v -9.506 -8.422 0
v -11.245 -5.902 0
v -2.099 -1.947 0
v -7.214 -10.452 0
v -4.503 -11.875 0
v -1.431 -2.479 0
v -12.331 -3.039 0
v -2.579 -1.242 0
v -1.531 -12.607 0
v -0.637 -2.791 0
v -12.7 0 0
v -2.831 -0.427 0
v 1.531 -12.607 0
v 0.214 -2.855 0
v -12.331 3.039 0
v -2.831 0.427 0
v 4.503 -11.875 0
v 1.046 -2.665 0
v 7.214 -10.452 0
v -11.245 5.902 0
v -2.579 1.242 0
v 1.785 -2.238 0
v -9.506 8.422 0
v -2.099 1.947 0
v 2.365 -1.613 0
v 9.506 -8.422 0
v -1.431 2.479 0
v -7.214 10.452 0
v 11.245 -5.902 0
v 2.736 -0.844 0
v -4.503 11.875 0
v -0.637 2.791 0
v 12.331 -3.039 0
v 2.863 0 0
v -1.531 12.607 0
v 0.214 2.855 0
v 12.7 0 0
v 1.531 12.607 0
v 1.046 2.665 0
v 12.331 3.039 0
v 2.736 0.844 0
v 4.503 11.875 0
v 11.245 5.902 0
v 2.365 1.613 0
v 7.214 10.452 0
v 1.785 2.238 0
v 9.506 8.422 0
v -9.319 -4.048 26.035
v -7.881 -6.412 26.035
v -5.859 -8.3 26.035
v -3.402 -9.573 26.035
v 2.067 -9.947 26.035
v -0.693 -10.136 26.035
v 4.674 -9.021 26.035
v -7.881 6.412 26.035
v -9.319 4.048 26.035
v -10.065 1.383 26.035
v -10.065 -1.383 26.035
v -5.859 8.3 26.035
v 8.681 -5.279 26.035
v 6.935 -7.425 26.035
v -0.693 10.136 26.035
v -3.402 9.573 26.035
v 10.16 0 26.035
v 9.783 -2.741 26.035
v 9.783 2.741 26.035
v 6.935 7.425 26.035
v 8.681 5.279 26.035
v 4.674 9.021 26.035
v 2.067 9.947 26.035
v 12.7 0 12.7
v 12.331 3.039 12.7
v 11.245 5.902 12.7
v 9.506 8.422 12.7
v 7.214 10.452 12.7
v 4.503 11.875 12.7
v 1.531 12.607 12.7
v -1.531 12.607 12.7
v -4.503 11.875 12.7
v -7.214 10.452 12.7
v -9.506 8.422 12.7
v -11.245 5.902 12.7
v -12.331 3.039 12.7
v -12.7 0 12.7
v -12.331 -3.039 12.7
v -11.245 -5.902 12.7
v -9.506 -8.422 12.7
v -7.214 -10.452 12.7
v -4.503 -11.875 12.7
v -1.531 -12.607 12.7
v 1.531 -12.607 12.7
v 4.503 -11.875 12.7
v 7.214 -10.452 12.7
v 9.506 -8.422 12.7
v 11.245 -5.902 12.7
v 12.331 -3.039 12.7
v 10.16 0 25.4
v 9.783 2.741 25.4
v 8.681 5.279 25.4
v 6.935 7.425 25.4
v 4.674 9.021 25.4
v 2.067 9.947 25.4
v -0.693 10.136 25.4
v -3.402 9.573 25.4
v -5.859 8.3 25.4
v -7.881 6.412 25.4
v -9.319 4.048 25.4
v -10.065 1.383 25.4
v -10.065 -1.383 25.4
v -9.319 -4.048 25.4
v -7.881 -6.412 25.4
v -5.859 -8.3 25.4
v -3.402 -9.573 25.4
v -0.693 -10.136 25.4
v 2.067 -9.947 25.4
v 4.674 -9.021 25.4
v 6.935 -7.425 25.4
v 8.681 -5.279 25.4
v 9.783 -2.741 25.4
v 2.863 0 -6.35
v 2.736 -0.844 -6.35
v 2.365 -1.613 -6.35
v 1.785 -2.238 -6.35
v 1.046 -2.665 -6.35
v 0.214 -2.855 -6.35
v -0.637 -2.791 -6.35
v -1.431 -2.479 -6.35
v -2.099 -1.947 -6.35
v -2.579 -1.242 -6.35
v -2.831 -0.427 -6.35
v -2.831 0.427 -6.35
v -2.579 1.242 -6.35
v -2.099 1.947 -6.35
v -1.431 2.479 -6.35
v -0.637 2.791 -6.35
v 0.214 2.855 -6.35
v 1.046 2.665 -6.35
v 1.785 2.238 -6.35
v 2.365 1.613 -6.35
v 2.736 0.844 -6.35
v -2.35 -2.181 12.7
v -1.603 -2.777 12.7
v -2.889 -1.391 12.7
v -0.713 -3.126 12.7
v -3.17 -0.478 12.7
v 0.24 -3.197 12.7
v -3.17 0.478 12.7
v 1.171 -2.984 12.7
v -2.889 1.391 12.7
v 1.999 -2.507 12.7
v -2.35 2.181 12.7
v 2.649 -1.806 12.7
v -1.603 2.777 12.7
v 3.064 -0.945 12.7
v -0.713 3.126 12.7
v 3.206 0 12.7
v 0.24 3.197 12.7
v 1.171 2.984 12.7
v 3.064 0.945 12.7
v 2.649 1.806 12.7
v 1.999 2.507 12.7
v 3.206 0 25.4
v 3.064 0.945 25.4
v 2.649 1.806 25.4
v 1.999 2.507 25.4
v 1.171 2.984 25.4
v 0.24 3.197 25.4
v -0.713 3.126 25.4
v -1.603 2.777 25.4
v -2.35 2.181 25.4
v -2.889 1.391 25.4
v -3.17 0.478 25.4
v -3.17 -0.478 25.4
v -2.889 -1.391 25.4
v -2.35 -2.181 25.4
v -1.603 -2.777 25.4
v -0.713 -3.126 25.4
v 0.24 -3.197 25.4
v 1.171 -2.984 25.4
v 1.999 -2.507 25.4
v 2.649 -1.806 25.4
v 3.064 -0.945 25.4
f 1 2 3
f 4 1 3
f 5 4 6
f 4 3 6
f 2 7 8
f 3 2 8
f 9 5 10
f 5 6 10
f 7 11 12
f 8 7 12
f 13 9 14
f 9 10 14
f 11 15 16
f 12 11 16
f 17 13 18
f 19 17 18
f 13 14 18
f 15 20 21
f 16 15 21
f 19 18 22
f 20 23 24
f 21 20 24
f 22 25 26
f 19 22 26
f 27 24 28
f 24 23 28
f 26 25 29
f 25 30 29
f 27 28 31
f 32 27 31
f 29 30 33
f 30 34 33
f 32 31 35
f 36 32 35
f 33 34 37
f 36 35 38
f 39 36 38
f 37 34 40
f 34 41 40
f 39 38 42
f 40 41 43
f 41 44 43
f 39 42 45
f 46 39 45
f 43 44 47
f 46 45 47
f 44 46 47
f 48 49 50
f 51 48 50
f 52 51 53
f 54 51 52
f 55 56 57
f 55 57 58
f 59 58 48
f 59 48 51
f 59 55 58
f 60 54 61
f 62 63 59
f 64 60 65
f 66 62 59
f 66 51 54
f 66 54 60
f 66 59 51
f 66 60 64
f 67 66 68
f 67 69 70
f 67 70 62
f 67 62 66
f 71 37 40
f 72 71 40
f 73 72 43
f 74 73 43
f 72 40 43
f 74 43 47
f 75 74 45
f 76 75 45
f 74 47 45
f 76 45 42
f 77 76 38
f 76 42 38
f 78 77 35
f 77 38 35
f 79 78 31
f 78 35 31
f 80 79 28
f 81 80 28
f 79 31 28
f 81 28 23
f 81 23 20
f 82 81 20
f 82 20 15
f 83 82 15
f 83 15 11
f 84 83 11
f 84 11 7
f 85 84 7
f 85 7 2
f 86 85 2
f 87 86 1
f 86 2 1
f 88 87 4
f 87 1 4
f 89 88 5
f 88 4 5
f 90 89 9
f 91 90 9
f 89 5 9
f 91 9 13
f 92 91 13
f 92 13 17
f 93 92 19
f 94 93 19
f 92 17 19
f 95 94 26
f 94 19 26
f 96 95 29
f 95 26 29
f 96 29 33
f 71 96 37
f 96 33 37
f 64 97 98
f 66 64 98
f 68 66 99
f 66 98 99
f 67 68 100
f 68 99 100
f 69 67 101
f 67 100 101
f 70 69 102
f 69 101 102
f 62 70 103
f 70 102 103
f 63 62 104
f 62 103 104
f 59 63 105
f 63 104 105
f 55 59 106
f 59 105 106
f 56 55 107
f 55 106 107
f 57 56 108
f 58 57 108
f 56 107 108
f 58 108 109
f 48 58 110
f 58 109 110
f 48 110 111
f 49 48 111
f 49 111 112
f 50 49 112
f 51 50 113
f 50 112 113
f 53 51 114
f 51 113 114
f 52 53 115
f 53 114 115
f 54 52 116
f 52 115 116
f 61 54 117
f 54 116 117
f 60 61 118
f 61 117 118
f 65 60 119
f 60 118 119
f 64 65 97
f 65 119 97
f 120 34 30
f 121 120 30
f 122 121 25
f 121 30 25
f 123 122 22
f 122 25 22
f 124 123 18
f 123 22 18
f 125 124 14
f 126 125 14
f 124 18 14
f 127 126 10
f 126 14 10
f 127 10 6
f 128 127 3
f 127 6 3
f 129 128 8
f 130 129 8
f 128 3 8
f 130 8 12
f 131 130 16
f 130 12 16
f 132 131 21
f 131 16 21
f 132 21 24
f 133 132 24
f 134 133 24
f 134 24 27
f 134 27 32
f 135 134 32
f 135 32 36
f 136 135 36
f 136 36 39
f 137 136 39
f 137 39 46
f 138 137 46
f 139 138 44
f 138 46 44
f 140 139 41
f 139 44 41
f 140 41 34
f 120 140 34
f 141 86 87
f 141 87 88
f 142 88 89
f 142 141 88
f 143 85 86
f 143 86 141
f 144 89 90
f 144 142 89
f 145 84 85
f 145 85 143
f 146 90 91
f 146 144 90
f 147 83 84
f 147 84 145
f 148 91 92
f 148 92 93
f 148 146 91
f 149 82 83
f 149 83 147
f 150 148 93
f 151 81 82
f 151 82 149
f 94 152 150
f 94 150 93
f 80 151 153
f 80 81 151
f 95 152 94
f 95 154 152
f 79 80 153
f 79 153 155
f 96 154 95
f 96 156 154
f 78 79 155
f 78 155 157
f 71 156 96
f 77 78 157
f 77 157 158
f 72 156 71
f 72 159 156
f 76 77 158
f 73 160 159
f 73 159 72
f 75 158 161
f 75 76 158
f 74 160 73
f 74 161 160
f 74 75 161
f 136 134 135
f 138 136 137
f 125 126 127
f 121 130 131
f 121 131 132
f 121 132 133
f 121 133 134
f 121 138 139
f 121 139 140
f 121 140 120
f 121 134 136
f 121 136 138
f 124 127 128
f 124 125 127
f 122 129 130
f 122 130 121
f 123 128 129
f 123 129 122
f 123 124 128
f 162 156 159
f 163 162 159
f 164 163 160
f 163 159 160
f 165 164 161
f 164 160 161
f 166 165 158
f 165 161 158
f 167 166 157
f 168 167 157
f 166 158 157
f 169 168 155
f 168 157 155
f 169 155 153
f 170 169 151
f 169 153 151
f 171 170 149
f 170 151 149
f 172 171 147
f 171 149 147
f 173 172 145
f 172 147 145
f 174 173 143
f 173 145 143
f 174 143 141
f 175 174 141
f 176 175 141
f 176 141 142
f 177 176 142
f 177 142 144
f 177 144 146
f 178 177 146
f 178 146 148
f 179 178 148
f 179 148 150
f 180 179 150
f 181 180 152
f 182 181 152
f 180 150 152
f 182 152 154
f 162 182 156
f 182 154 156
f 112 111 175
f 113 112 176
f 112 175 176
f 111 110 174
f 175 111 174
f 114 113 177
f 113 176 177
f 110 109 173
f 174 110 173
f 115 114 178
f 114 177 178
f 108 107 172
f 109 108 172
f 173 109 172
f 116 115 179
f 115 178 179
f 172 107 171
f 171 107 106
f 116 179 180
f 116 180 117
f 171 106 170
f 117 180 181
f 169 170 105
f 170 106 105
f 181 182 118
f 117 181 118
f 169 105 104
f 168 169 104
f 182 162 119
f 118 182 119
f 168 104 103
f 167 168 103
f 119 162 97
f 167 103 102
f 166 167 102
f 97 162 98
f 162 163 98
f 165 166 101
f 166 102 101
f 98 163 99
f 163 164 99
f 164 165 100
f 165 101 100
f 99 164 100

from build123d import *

# Parameters (mm, degrees)
F0_R     = 12.7
F1_DEPTH = 12.7
F2_R     = 3.20606
F3_DEPTH = 12.7
F4_R     = 10.16
F5_DEPTH = 0.635
F6_R     = 2.86289
F7_DEPTH = 6.35


with BuildPart() as f1:
    # F0 (on Top) → F1 (new body)
    with BuildSketch(Plane.XY):
        Circle(F0_R)
    extrude(amount=F1_DEPTH)

    # F2 (on face) → F3 (join)
    with BuildSketch(Plane.XY.offset(12.7)):
        Circle(F2_R)
    extrude(amount=F3_DEPTH)

    # F4 (on face) → F5 (join)
    with BuildSketch(Plane.XY.offset(25.4)):
        Circle(F4_R)
    extrude(amount=F5_DEPTH)

    # F6 (on face) → F7 (join)
    with BuildSketch(Plane(origin=(0, 0, 0), x_dir=(1, 0, 0), z_dir=(0, 0, -1))):
        Circle(F6_R)
    extrude(amount=F7_DEPTH)


solid = f1.part
